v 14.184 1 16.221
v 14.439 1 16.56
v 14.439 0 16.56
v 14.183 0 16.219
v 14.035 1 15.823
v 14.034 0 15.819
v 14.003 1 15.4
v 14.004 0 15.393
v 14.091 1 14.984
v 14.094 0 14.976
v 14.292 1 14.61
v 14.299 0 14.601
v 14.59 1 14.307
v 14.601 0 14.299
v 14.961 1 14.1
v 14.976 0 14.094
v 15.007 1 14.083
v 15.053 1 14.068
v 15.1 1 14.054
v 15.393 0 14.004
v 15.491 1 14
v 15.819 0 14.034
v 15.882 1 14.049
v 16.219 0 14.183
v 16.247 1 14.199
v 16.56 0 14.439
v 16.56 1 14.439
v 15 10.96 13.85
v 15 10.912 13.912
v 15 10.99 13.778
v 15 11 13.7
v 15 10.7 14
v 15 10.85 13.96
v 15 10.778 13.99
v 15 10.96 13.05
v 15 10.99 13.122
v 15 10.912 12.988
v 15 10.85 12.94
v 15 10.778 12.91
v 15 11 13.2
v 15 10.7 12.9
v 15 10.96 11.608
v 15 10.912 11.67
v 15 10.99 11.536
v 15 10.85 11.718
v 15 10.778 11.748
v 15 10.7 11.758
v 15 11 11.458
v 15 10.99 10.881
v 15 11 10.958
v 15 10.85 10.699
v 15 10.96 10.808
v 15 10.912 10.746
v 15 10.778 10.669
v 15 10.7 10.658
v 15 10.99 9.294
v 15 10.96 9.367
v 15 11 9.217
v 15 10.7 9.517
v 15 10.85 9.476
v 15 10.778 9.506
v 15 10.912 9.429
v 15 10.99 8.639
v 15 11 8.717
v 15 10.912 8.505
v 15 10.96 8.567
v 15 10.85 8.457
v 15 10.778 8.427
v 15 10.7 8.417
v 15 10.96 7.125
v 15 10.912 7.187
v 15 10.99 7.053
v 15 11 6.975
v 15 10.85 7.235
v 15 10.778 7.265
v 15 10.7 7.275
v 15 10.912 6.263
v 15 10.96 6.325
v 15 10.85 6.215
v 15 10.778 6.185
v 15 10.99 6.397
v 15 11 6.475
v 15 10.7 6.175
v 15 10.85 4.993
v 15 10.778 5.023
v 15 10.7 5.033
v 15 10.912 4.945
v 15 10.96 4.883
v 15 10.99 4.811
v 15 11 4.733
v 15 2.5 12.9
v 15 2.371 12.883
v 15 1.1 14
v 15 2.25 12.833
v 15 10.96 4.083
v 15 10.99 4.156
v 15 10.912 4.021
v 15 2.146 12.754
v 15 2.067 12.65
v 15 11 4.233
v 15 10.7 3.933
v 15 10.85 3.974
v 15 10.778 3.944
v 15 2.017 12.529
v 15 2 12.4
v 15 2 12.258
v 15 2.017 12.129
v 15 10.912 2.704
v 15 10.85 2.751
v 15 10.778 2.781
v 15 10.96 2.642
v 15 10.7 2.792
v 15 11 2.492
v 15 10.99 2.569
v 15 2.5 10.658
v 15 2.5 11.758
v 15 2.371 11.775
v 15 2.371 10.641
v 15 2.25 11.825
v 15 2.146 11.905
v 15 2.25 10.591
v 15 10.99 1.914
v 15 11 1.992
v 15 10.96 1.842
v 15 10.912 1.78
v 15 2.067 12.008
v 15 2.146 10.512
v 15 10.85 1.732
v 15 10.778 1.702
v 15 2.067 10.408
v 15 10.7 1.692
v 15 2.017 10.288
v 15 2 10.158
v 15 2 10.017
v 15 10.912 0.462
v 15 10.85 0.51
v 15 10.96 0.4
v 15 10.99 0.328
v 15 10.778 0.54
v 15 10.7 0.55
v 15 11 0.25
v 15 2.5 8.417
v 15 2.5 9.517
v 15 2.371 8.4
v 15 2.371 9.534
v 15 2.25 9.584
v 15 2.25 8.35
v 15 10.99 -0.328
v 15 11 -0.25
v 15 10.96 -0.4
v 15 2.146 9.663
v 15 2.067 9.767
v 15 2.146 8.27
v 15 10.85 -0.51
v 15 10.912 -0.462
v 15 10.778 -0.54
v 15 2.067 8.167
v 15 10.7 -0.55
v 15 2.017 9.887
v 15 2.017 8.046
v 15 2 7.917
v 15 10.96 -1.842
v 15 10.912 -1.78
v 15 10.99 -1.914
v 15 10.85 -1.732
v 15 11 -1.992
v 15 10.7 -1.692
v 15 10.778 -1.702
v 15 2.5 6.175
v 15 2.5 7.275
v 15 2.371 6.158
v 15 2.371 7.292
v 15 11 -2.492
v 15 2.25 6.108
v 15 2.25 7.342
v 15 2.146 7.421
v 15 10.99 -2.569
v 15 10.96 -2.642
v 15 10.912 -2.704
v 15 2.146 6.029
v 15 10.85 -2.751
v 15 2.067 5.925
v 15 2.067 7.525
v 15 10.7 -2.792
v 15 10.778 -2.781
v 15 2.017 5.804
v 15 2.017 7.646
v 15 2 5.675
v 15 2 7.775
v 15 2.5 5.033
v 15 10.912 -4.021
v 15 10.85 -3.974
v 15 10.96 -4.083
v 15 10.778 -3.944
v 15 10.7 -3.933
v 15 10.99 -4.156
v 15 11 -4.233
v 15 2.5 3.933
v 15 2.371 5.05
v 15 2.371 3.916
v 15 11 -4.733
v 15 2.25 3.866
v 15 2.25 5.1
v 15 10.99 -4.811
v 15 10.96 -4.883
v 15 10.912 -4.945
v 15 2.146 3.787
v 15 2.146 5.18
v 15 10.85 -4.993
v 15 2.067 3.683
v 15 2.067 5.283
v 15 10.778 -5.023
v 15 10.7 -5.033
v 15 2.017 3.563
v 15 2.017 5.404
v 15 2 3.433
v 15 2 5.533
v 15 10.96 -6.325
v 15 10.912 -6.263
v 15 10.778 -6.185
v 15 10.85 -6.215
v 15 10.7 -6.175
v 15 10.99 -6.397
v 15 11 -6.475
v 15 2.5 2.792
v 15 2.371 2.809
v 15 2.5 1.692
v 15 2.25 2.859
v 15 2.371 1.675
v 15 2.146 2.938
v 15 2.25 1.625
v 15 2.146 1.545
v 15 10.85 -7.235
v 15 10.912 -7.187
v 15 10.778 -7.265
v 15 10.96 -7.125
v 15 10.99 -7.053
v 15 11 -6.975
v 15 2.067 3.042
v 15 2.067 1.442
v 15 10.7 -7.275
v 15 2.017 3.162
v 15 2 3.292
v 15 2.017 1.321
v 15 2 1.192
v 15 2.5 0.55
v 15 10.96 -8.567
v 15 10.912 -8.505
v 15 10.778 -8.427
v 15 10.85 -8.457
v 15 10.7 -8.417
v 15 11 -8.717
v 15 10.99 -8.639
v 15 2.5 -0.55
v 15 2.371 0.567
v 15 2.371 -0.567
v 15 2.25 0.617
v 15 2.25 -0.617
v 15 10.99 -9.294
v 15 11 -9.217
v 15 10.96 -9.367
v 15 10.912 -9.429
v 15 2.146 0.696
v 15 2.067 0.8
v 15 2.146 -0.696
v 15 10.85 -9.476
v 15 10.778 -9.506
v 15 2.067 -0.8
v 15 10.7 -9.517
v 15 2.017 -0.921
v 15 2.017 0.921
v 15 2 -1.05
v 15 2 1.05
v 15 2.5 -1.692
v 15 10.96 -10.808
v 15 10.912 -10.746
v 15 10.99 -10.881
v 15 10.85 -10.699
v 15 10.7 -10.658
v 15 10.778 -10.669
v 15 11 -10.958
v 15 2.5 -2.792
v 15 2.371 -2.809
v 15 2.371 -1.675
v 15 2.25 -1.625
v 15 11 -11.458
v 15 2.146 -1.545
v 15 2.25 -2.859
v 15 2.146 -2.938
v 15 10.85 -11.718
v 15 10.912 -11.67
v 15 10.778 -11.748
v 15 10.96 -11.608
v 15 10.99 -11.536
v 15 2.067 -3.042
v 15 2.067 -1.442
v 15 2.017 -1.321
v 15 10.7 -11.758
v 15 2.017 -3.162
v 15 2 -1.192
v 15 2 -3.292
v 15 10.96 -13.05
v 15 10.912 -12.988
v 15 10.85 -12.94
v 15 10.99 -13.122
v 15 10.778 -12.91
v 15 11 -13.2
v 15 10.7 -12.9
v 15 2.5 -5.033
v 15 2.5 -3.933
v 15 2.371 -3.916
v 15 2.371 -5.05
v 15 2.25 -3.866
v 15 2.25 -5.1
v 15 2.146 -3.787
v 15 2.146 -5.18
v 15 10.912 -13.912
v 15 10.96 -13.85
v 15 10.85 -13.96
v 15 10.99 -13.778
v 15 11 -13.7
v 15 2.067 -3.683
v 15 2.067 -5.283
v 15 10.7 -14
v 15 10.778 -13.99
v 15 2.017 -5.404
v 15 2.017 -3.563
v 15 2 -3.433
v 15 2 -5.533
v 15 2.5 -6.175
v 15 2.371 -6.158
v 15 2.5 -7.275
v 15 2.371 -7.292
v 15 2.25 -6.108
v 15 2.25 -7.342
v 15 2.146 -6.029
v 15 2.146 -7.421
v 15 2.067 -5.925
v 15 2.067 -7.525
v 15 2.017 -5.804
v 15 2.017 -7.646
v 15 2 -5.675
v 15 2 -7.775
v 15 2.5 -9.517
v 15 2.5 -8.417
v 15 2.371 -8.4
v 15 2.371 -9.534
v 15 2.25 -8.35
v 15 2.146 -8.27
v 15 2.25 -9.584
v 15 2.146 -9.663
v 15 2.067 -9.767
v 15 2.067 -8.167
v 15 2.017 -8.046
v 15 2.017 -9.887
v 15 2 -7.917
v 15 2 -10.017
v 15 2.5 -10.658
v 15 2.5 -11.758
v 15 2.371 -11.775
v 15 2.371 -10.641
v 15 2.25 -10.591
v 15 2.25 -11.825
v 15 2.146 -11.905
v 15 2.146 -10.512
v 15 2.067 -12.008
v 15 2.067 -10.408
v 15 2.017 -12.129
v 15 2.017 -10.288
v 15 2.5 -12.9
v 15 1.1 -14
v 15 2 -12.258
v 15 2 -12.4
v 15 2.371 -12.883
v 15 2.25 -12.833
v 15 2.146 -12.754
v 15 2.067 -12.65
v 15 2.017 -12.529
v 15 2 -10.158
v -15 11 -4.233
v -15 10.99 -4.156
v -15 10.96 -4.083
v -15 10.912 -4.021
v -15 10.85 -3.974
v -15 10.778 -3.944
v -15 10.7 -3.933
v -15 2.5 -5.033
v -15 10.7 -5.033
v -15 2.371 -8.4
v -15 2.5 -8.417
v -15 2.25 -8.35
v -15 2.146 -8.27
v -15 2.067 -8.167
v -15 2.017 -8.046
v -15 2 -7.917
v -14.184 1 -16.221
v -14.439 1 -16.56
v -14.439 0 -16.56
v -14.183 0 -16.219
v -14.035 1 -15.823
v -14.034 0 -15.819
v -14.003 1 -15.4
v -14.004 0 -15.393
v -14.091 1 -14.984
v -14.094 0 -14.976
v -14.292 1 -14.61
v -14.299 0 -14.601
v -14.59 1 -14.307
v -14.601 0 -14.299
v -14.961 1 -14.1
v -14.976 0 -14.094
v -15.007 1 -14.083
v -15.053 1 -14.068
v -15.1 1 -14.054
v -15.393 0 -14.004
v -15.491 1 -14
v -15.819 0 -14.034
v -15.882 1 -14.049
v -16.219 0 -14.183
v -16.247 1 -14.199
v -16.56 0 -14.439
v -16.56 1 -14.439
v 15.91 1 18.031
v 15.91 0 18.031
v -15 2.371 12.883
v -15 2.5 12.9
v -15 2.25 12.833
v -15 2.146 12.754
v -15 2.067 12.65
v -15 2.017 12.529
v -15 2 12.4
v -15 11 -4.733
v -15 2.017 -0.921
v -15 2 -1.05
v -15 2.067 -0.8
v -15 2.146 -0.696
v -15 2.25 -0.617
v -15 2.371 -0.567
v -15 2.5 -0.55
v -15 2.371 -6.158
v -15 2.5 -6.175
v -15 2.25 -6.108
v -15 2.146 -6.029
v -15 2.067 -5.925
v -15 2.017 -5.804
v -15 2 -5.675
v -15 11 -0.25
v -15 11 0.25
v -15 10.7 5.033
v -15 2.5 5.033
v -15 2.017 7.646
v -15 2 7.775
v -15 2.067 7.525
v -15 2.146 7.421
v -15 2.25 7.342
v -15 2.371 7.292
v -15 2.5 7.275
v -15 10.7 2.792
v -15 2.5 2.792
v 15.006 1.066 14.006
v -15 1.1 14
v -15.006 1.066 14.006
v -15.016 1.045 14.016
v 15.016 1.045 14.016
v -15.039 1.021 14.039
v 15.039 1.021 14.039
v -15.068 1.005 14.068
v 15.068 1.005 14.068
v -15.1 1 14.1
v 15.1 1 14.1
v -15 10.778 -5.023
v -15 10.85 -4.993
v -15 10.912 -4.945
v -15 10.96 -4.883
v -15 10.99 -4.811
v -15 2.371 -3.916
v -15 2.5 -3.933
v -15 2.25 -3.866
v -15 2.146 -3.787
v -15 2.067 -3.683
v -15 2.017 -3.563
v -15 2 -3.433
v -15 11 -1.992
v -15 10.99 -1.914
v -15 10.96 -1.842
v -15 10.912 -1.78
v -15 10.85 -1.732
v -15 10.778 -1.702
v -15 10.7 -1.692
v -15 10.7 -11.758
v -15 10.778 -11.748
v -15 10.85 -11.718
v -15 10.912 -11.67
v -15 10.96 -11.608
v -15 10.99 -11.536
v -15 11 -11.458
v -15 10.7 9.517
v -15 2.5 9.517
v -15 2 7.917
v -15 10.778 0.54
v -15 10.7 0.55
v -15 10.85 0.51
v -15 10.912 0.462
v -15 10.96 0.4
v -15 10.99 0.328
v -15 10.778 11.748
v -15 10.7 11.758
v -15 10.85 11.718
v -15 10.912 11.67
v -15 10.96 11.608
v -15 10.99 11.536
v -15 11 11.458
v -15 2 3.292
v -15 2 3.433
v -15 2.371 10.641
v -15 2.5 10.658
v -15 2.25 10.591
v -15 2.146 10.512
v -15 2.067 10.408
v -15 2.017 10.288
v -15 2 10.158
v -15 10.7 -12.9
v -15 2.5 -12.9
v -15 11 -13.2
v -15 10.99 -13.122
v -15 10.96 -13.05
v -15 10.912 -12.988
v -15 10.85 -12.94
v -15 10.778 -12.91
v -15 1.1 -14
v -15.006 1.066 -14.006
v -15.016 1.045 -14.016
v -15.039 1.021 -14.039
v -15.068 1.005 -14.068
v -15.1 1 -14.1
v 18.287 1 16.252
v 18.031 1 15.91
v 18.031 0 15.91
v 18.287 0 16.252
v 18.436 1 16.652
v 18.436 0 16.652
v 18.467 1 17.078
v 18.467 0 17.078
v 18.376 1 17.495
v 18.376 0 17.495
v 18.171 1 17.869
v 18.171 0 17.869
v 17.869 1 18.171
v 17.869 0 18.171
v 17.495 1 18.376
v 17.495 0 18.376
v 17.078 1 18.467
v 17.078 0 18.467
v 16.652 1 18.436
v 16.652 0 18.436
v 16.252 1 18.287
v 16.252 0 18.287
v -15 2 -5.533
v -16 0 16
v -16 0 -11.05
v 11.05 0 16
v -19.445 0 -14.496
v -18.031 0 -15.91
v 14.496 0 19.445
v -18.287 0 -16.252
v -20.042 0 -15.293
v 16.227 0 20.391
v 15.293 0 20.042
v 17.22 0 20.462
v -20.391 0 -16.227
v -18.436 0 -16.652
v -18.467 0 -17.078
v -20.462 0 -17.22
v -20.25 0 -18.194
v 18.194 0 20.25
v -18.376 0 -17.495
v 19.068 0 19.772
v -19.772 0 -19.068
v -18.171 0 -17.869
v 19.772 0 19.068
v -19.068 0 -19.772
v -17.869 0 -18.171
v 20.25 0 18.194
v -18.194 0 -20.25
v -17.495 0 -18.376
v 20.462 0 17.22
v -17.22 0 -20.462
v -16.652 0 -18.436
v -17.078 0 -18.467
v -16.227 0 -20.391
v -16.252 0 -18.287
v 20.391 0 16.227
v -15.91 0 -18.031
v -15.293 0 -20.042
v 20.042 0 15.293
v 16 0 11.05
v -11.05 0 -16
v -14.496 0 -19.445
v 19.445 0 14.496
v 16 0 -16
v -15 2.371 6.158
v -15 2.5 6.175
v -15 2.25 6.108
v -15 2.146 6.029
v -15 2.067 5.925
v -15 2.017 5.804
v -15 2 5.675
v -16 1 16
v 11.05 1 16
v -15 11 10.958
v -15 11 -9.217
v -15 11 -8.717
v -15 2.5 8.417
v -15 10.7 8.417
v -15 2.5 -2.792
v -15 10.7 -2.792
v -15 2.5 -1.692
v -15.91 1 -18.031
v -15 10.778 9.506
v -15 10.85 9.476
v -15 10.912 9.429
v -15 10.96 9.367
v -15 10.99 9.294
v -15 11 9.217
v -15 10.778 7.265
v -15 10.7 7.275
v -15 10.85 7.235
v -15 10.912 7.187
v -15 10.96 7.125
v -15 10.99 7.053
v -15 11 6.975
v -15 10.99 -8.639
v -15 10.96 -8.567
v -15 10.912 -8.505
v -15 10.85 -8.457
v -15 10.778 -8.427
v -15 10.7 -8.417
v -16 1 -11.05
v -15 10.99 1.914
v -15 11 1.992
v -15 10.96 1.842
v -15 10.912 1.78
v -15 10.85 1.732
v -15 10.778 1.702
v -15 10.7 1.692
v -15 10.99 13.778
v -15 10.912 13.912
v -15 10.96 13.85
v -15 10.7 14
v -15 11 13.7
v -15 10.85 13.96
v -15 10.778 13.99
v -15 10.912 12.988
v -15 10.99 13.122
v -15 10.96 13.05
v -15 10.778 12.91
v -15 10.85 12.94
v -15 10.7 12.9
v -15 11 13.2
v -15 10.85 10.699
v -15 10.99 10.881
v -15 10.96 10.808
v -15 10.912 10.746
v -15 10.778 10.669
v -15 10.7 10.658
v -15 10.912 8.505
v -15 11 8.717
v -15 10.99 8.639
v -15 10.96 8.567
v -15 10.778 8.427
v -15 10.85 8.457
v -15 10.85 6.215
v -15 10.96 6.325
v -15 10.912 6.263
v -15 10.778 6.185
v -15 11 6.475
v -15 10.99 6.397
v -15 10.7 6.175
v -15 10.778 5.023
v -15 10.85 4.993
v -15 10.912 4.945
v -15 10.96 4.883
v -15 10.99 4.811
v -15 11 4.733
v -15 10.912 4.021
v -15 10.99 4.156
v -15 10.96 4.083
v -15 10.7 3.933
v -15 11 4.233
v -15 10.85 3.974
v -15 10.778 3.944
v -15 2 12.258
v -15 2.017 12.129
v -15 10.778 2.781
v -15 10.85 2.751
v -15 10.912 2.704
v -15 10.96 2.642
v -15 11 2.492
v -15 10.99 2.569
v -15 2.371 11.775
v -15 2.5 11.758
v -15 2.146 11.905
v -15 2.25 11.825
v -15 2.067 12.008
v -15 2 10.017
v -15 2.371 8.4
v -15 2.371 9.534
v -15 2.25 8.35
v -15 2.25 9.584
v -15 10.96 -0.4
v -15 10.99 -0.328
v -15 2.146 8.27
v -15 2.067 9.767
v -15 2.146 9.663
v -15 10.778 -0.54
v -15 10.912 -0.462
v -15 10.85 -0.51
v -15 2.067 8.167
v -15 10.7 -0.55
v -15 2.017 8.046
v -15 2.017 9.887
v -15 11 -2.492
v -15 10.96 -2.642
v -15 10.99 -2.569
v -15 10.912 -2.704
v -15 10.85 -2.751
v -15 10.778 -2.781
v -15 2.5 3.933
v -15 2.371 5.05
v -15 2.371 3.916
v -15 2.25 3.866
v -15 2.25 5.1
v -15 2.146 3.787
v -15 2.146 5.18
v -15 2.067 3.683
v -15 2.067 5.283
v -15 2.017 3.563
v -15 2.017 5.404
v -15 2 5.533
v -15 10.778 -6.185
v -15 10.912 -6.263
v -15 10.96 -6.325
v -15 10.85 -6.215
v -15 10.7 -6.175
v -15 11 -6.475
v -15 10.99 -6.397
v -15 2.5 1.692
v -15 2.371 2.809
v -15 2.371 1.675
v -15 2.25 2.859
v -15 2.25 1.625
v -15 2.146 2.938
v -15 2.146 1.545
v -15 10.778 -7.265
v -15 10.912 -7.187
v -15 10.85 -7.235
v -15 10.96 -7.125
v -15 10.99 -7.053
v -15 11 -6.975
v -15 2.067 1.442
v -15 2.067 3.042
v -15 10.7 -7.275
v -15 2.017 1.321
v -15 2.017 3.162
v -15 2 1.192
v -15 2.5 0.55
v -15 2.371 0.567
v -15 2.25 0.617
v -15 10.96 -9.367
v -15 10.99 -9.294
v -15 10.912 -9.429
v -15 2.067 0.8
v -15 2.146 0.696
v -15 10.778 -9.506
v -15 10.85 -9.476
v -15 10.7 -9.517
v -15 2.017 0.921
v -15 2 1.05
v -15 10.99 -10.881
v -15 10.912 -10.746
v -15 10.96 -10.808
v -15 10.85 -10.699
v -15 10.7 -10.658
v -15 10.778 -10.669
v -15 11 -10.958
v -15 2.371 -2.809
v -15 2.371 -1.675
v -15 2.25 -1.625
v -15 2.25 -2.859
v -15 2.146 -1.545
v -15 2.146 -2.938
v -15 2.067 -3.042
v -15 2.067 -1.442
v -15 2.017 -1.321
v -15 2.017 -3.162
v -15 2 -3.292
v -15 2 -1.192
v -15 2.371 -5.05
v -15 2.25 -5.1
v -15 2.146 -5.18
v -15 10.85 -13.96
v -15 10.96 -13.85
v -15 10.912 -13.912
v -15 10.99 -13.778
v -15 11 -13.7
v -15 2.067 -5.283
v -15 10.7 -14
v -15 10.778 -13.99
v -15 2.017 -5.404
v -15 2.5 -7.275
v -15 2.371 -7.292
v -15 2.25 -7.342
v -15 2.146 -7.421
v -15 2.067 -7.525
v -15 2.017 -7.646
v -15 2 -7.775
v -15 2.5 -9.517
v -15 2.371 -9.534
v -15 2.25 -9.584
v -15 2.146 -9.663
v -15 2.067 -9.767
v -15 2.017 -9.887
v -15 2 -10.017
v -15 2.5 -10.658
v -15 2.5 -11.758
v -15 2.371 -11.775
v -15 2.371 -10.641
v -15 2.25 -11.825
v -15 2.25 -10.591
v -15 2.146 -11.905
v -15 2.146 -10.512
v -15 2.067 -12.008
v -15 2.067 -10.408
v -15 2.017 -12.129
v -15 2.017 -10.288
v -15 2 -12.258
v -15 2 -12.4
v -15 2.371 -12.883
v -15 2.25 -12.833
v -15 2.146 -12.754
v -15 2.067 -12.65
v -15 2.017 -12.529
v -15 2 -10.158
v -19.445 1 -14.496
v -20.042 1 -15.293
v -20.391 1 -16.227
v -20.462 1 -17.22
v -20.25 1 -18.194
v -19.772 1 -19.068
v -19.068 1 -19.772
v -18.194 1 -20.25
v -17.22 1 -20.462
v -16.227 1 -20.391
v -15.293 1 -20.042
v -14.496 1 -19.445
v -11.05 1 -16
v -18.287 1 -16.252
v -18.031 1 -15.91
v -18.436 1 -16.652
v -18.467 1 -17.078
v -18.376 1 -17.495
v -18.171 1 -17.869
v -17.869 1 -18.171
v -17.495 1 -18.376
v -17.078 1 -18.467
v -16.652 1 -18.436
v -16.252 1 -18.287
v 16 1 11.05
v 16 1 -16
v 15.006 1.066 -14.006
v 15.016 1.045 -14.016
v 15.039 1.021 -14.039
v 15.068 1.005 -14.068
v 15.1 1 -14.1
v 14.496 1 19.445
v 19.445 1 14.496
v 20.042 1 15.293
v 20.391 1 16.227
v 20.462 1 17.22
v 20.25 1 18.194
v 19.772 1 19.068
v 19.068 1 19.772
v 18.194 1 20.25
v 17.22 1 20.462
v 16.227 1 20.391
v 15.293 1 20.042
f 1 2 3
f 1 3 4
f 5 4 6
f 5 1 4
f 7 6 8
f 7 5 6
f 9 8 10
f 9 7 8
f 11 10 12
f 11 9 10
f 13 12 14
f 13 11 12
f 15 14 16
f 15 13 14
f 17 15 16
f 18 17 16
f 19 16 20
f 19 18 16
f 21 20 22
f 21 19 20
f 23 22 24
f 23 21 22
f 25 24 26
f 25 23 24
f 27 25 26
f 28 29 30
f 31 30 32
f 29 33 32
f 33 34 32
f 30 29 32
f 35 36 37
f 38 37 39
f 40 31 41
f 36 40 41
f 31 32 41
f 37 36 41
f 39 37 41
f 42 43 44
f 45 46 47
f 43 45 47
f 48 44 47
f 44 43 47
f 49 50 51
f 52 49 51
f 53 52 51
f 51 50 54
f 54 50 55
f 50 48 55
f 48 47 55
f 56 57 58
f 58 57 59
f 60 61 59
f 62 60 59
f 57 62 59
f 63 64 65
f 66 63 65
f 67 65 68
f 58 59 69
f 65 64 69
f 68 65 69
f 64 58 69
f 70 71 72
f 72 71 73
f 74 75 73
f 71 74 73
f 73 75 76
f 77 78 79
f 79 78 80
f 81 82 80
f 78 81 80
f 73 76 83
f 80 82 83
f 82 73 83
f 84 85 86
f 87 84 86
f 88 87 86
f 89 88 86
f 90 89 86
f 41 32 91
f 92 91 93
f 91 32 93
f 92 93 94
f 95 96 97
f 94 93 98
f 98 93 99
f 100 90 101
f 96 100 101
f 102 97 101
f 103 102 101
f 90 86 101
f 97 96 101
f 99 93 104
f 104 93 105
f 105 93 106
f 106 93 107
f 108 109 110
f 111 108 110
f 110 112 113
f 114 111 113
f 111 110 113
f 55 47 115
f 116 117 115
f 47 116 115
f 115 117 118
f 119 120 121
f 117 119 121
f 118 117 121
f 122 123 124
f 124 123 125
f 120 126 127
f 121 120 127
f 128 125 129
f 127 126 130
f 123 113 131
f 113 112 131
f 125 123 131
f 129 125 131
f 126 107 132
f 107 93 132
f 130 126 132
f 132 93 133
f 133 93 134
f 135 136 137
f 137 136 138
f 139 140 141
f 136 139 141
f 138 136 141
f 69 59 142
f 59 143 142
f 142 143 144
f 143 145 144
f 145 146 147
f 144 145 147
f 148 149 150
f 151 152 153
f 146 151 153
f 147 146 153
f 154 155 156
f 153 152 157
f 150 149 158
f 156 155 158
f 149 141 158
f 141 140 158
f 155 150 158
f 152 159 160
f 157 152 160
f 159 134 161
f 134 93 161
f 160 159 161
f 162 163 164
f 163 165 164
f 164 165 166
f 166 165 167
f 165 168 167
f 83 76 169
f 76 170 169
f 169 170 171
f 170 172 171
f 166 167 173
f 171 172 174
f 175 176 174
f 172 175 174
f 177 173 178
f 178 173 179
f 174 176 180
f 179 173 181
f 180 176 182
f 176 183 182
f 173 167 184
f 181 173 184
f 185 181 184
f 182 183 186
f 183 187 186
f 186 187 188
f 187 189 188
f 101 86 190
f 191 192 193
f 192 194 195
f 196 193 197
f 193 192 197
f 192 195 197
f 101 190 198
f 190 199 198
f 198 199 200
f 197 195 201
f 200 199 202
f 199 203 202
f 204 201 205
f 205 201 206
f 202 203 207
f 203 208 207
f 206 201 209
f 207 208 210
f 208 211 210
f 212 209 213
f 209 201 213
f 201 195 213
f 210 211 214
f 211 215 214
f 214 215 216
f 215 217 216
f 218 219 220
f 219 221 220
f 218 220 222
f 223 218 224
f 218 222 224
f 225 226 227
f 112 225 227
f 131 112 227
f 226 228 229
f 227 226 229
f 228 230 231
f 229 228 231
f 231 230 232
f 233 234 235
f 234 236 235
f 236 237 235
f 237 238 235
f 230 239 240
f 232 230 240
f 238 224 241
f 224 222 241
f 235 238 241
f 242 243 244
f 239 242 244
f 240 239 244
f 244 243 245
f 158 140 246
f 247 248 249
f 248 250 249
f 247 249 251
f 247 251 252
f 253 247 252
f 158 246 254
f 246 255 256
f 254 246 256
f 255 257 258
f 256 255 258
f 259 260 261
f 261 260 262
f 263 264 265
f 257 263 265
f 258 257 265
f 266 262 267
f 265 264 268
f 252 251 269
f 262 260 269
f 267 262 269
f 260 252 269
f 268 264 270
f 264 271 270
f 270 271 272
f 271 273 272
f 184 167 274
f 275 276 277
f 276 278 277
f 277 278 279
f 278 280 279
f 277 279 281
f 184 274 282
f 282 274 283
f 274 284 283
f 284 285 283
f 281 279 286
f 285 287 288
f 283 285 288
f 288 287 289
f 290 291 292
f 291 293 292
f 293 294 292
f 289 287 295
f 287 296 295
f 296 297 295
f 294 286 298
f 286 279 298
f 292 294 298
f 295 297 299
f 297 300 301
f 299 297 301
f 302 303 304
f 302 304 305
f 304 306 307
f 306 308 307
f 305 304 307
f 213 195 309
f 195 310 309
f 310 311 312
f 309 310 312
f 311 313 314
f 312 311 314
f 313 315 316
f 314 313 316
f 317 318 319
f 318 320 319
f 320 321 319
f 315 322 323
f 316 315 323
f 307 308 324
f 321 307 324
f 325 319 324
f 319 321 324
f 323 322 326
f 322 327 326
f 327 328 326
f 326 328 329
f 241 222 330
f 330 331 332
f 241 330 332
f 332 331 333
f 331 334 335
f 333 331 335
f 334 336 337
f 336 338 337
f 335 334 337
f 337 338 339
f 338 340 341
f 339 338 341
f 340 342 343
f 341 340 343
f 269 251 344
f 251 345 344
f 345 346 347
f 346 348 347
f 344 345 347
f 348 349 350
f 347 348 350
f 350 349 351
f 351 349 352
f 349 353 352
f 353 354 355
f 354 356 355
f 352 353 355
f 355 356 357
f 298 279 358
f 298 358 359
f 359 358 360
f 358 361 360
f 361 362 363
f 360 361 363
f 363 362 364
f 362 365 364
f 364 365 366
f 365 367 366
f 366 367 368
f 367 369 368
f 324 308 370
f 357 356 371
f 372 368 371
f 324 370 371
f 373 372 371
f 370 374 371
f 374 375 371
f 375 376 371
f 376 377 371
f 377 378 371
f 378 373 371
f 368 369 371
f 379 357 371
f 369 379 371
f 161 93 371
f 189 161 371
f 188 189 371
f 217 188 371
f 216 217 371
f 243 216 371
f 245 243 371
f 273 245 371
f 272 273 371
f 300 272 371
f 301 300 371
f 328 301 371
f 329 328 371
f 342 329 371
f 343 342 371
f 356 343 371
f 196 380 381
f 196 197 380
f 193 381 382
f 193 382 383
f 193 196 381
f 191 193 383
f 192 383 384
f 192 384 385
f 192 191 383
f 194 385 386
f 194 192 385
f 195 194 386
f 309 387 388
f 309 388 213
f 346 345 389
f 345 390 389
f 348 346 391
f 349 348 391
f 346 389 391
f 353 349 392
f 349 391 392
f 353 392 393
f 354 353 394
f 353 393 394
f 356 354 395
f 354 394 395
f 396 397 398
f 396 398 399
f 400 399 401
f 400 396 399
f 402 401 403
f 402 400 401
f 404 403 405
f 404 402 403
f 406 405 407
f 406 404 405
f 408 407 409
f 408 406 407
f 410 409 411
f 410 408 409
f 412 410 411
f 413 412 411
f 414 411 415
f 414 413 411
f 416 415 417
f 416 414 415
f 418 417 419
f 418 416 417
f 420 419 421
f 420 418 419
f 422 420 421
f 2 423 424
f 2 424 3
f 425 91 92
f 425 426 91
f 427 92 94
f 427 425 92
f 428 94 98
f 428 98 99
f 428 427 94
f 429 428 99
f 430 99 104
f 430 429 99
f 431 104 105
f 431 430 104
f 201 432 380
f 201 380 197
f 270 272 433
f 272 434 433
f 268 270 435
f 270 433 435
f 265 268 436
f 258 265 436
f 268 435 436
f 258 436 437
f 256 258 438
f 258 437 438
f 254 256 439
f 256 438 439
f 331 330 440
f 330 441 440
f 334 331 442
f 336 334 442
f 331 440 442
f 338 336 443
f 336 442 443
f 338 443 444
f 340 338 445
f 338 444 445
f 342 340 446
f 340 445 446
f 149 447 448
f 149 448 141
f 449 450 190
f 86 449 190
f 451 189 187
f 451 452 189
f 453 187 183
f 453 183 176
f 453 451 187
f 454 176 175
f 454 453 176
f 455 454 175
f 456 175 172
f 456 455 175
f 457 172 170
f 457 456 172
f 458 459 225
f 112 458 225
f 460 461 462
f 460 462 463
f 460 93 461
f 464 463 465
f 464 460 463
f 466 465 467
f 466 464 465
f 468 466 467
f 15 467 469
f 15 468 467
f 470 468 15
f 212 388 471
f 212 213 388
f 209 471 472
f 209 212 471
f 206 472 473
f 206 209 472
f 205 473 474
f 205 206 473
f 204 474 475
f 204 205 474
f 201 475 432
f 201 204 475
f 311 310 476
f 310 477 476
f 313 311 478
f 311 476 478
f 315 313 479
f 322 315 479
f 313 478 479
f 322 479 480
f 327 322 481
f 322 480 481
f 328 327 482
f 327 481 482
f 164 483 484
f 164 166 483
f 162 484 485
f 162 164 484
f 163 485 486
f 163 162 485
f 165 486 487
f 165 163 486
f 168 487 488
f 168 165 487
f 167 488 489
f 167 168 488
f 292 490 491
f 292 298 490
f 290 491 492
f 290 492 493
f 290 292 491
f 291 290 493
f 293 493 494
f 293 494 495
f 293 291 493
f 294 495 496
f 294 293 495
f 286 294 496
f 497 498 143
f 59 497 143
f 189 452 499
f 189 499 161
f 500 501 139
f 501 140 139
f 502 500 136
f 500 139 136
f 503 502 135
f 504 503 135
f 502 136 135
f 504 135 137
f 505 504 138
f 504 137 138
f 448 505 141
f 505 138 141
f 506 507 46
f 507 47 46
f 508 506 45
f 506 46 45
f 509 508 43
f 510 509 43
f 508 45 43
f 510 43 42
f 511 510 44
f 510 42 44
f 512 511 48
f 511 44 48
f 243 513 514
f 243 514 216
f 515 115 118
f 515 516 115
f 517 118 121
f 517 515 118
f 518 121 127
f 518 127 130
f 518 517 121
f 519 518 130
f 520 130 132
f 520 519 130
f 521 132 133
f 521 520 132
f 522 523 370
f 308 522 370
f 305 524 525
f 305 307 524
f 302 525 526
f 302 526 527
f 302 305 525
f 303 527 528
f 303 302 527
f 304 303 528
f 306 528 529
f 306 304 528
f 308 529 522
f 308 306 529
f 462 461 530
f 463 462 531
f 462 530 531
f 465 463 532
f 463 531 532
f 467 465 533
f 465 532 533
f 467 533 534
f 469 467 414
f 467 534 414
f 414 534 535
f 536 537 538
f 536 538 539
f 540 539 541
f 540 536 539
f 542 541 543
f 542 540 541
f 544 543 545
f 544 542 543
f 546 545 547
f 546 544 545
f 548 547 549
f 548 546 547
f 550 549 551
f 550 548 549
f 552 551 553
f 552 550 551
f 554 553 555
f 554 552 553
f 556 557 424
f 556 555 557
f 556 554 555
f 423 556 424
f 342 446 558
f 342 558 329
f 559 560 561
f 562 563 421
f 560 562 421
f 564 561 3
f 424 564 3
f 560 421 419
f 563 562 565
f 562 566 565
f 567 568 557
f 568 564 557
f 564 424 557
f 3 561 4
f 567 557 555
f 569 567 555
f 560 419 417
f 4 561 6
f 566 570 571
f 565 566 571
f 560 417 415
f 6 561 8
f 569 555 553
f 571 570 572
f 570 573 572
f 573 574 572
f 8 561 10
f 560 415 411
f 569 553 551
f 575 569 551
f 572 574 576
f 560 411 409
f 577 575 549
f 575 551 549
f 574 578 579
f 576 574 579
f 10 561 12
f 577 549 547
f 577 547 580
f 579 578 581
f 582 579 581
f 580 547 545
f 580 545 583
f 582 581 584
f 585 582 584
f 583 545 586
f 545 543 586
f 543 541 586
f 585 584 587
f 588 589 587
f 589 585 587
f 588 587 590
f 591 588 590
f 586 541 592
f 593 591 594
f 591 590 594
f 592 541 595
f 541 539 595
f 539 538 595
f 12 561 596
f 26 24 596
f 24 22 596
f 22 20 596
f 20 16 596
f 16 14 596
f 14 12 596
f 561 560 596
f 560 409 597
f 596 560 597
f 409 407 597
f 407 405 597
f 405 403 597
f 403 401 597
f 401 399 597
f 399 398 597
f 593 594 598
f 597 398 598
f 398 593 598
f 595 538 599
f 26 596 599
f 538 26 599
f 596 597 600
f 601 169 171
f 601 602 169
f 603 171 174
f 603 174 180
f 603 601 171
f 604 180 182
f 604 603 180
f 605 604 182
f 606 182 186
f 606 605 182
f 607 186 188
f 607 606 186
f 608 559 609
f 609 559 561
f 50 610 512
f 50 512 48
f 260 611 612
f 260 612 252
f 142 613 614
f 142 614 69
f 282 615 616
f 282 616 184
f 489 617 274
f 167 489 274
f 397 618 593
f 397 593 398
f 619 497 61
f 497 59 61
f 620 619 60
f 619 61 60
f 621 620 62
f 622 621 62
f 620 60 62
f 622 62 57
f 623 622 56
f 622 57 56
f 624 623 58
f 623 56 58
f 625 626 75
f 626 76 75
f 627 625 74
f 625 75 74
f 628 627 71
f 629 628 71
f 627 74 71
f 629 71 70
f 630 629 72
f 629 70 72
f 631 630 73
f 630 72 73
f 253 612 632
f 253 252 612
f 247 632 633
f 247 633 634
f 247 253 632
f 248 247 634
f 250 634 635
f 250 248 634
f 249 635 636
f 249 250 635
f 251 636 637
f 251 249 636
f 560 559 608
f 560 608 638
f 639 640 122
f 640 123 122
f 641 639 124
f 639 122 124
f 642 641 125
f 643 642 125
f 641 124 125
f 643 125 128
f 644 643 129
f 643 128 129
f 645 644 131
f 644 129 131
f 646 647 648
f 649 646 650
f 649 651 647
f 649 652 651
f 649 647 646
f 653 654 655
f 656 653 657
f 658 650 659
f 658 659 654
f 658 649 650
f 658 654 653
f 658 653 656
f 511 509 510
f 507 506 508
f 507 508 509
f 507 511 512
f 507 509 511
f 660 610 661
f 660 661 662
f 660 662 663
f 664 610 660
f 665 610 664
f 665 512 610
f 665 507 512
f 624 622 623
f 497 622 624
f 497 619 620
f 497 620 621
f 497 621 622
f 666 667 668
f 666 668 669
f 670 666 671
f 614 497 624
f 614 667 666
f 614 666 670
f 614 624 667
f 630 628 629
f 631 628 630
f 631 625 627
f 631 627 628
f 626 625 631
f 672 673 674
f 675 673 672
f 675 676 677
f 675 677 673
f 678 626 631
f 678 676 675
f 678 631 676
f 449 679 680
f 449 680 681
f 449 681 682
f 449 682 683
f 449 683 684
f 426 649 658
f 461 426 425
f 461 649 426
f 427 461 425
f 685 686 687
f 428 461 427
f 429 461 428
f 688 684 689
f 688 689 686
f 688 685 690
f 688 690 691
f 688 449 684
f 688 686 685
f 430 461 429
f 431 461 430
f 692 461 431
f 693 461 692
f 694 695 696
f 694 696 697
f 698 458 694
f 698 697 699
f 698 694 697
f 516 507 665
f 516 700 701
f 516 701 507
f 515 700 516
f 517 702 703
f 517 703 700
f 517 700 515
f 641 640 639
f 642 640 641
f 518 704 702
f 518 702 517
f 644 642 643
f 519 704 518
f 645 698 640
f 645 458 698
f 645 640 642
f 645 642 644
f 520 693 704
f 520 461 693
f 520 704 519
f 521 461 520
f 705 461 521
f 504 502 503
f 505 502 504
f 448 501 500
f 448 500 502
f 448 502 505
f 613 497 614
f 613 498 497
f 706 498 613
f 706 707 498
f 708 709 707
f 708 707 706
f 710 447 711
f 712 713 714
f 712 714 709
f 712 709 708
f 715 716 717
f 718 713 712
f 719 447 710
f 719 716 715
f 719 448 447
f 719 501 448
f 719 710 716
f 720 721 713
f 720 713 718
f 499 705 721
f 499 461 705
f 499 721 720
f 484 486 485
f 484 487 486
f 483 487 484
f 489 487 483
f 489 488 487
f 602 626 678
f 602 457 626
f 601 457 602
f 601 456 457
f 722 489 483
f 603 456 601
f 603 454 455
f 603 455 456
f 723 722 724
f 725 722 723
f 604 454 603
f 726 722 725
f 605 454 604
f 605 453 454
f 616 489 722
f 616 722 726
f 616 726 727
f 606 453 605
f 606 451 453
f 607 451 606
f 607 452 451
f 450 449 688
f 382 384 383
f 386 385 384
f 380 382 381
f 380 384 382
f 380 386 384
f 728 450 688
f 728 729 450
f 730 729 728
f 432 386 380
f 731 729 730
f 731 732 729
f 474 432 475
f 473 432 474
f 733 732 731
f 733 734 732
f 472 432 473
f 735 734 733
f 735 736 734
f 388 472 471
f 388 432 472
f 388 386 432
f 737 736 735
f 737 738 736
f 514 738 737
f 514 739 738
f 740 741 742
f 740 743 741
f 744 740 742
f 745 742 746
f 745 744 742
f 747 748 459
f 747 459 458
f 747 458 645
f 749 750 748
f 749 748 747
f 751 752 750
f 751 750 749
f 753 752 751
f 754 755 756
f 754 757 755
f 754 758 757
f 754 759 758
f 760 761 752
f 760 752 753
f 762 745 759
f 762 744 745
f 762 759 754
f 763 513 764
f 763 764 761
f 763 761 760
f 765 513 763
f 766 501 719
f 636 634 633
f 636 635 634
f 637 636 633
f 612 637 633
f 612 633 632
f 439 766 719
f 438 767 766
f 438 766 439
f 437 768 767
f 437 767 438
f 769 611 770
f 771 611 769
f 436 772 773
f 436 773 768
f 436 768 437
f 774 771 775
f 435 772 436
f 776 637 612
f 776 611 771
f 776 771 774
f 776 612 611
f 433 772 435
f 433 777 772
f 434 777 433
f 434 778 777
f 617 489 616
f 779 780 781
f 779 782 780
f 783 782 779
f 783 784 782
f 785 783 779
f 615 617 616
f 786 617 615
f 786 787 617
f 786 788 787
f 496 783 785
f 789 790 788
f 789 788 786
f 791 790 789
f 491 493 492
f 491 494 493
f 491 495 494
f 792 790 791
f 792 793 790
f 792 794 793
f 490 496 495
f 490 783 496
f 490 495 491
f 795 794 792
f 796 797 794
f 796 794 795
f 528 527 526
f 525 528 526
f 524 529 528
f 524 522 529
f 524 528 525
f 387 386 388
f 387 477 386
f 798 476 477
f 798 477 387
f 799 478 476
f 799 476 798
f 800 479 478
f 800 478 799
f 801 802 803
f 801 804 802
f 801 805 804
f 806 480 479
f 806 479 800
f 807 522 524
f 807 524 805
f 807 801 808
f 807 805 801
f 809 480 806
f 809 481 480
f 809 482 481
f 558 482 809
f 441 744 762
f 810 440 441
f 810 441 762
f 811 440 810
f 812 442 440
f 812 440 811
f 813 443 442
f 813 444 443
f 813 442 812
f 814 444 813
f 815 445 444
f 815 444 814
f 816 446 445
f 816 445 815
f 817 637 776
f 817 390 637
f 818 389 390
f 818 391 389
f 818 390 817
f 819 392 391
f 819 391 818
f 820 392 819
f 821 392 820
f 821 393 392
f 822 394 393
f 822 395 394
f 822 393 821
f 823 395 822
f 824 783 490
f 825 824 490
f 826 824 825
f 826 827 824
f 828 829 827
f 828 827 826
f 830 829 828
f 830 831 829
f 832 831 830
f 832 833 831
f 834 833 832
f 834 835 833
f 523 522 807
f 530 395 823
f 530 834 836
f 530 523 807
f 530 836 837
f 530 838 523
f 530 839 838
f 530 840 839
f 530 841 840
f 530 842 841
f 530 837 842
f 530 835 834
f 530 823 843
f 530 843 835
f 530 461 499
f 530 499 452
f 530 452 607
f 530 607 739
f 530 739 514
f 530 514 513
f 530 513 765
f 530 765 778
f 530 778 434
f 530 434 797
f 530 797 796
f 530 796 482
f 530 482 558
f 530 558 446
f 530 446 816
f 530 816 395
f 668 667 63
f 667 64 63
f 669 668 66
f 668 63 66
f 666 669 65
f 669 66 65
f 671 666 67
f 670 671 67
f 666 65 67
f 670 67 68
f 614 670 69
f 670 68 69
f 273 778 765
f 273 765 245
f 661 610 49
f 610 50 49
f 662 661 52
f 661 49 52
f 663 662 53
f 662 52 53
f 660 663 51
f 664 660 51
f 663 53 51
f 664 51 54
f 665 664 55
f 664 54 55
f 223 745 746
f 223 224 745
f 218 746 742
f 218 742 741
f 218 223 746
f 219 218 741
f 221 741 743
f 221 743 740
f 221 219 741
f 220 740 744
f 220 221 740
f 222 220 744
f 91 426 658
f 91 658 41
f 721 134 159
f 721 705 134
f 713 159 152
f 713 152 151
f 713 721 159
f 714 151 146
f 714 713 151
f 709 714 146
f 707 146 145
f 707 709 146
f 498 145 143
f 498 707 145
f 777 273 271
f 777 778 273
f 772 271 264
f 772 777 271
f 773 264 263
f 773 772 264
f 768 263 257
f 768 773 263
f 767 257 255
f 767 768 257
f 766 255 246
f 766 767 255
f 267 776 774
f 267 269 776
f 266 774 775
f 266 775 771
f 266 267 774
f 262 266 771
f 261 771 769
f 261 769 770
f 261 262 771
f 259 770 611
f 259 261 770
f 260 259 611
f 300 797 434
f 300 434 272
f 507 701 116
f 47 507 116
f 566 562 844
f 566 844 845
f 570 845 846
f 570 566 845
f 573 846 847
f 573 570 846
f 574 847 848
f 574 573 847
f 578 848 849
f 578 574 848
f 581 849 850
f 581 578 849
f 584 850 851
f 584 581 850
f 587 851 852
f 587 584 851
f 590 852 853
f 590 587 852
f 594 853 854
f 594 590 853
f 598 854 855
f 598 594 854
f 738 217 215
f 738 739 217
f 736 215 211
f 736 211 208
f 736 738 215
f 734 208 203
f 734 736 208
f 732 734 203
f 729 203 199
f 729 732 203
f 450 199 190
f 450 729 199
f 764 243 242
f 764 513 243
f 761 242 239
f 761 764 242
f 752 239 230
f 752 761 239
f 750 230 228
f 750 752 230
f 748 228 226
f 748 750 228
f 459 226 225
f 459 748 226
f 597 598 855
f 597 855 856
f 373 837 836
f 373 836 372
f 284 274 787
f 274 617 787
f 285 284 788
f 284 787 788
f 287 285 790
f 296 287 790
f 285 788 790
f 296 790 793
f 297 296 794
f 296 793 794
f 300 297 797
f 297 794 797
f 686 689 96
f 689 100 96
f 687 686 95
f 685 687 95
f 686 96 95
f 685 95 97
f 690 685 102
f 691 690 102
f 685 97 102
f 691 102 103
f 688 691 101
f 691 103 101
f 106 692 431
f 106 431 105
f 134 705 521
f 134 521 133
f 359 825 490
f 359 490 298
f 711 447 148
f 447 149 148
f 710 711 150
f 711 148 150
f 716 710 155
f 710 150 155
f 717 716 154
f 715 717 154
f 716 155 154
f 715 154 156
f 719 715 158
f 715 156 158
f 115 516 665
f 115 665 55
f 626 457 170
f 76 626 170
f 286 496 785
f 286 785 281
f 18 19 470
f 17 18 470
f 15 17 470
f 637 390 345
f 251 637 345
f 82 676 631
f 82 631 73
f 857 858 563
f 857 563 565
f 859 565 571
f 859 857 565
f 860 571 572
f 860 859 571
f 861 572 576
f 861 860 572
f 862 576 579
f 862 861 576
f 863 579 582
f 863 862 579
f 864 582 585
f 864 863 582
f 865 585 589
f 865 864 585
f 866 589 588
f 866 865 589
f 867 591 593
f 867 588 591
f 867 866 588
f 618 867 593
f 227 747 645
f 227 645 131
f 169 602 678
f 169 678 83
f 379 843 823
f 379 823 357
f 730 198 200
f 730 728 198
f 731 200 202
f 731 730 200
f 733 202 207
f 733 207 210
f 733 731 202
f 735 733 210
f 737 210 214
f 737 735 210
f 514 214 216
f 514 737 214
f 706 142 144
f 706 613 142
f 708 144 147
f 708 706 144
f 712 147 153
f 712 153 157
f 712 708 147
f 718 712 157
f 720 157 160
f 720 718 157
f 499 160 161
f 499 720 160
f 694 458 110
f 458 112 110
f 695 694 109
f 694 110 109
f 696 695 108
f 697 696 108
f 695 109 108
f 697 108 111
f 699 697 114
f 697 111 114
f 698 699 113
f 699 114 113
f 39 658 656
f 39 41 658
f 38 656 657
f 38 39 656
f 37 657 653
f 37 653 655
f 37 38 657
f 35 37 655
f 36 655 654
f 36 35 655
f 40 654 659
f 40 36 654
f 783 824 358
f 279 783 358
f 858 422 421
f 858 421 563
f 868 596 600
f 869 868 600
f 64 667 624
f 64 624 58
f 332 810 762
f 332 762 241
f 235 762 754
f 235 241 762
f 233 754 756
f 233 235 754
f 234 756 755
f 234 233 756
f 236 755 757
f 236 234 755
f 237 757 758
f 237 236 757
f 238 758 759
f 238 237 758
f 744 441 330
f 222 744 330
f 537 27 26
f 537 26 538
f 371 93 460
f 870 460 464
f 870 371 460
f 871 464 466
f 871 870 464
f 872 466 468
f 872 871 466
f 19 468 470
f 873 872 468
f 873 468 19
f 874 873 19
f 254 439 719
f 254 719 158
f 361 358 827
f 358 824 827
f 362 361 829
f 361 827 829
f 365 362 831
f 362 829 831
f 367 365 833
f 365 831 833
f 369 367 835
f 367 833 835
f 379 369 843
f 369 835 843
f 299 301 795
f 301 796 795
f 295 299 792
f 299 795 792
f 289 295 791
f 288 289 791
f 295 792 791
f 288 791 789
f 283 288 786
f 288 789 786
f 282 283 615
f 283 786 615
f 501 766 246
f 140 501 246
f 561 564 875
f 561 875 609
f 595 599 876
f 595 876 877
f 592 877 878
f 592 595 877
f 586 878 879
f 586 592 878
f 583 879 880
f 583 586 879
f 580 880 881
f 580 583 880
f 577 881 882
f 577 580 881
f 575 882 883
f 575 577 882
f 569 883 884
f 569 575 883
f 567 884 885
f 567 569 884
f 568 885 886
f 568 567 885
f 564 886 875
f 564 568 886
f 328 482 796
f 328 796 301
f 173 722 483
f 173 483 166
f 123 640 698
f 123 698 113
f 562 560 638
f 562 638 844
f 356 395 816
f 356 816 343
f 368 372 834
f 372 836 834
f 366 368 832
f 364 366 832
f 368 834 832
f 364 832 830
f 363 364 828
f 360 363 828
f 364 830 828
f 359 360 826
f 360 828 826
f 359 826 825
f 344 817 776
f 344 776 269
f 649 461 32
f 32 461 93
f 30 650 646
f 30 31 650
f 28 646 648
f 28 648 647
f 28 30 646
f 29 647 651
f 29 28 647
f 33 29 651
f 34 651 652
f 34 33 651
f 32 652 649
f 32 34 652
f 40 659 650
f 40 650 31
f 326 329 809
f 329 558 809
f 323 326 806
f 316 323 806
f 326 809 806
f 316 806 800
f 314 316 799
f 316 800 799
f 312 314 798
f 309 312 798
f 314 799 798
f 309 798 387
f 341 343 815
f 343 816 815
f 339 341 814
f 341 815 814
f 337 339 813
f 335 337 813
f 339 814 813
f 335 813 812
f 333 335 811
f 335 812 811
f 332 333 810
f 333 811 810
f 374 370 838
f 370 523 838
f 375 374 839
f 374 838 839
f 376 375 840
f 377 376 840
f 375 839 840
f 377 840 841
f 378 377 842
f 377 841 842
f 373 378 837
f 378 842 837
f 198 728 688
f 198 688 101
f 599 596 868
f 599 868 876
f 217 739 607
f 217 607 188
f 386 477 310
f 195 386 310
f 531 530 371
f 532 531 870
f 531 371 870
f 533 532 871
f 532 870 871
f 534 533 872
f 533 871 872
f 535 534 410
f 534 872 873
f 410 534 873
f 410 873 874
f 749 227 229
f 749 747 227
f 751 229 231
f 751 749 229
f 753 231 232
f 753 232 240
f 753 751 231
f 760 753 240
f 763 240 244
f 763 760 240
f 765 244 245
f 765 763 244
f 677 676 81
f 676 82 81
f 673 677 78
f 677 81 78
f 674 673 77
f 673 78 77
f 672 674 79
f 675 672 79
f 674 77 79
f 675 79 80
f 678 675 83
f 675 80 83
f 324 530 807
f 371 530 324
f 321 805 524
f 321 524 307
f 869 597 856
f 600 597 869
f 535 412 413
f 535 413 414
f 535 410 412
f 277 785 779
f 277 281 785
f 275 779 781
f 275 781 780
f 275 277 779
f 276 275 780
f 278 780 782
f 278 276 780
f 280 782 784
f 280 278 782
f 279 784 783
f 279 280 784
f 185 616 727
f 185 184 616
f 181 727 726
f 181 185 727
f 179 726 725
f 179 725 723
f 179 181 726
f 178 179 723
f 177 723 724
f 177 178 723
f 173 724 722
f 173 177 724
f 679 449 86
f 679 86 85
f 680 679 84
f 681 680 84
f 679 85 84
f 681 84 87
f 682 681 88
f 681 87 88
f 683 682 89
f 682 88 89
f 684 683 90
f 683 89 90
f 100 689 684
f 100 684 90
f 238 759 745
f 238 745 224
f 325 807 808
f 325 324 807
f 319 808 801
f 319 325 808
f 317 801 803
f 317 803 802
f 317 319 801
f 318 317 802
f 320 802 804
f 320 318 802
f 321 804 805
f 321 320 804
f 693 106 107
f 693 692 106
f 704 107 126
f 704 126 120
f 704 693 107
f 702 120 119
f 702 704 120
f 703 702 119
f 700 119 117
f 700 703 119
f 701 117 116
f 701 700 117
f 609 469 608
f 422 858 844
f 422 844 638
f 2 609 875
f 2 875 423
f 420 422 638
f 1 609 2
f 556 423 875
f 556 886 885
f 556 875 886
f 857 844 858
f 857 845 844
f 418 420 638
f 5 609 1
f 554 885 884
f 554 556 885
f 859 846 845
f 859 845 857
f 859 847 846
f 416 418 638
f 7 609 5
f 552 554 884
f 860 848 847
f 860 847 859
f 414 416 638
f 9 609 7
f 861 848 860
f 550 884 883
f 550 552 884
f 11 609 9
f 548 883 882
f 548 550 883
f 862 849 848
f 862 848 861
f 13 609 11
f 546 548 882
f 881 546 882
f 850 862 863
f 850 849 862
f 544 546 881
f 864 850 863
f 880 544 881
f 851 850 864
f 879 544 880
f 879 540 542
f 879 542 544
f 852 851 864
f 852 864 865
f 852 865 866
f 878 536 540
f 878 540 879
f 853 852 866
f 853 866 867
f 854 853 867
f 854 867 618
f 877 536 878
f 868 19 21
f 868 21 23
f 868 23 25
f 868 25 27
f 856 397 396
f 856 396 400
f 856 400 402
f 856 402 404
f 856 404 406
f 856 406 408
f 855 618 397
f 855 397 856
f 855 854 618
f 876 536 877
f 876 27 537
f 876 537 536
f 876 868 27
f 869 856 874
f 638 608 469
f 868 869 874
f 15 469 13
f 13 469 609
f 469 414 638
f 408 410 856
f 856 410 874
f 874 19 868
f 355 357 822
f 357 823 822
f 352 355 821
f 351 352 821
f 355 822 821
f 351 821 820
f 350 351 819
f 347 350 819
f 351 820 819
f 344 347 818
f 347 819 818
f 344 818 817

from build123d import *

# Parameters (mm, degrees)
SZKIC1_W                    = 32
SZKIC1_H                    = 32
DODANIE_WYCI_GNI_CIE2_DEPTH = 1
SZKIC3_W                    = 30
SZKIC3_H                    = 28
DODANIE_WYCI_GNI_CIE3_DEPTH = 1
SZKIC2_W                    = 30
SZKIC2_H                    = 1.1
DODANIE_WYCI_GNI_CIE4_DEPTH = 10
ZAOKR_GLENIE1_R             = 0.1
ZAOKR_GLENIE3_R             = 0.5
ZAOKR_GLENIE4_R             = 0.3
WYTNIJ_WYCI_GNI_CIE1_DEPTH  = 2


with BuildPart() as part:
    # Szkic1 → Dodanie-wyciągnięcie2 (new body)
    with BuildSketch(Plane(origin=(0, 0, 0), x_dir=(1, 0, 0), z_dir=(0, 1, 0))):
        Rectangle(SZKIC1_W, SZKIC1_H)
        with BuildLine():
            Line((-14.495689014, 19.445436483), (19.445436483, -14.495689014))
            ThreePointArc((19.445436483, -14.495689014), (19.445436483, -19.445436483), (14.495689014, -19.445436483))
            Line((14.495689014, -19.445436483), (-19.445436483, 14.495689014))
            ThreePointArc((-19.445436483, 14.495689014), (-19.445436483, 19.445436483), (-14.495689014, 19.445436483))
        make_face()
    extrude(amount=DODANIE_WYCI_GNI_CIE2_DEPTH)

    # Szkic3 → Dodanie-wyciągnięcie3 (add)
    with BuildSketch(Plane(origin=(0, 1, 0), x_dir=(1, 0, 0), z_dir=(0, 1, 0))):
        Rectangle(SZKIC3_W, SZKIC3_H)
    extrude(amount=DODANIE_WYCI_GNI_CIE3_DEPTH)

    # Szkic2 → Dodanie-wyciągnięcie4 (add)
    with BuildSketch(Plane(origin=(0, 1, 0), x_dir=(1, 0, 0), z_dir=(0, 1, 0))):
        with Locations((0, 13.45)):
            Rectangle(SZKIC2_W, SZKIC2_H)
        with Locations((0, 11.208333333)):
            Rectangle(SZKIC2_W, SZKIC2_H)
        with Locations((0, 8.966666667)):
            Rectangle(SZKIC2_W, SZKIC2_H)
        with Locations((0, 6.725)):
            Rectangle(SZKIC2_W, SZKIC2_H)
        with Locations((0, 4.483333333)):
            Rectangle(SZKIC2_W, SZKIC2_H)
        with Locations((0, 2.241666667)):
            Rectangle(SZKIC2_W, SZKIC2_H)
        Rectangle(SZKIC2_W, SZKIC2_H)
        with Locations((0, -2.241666667)):
            Rectangle(SZKIC2_W, SZKIC2_H)
        with Locations((0, -4.483333333)):
            Rectangle(SZKIC2_W, SZKIC2_H)
        with Locations((0, -6.725)):
            Rectangle(SZKIC2_W, SZKIC2_H)
        with Locations((0, -8.966666667)):
            Rectangle(SZKIC2_W, SZKIC2_H)
        with Locations((0, -11.208333333)):
            Rectangle(SZKIC2_W, SZKIC2_H)
        with Locations((0, -13.45)):
            Rectangle(SZKIC2_W, SZKIC2_H)
    extrude(amount=DODANIE_WYCI_GNI_CIE4_DEPTH)

    # Zaokrąglenie1
    zaokr_glenie1_edges = [part.edges().sort_by_distance(p)[0] for p in [
        (-15, 1, 0),
        (0, 1, 14),
        (15, 1, 0),
        (0, 1, -14),
    ]]
    fillet(zaokr_glenie1_edges, radius=ZAOKR_GLENIE1_R)

    # Zaokrąglenie3
    zaokr_glenie3_edges = [part.edges().sort_by_distance(p)[0] for p in [
        (0, 2, -6.175),
        (0, 2, -7.275),
        (0, 2, -3.933333333),
        (0, 2, -5.033333333),
        (0, 2, -1.691666667),
        (0, 2, -2.791666667),
        (0, 2, 0.55),
        (0, 2, -0.55),
        (0, 2, 2.791666667),
        (0, 2, 1.691666667),
        (0, 2, 5.033333333),
        (0, 2, 3.933333333),
        (0, 2, 7.275),
        (0, 2, 6.175),
        (0, 2, 9.516666667),
        (0, 2, 8.416666667),
        (0, 2, 11.758333333),
        (0, 2, 10.658333333),
        (0, 2, 12.9),
        (0, 2, -12.9),
        (0, 2, -10.658333333),
        (0, 2, -11.758333333),
        (0, 2, -8.416666667),
        (0, 2, -9.516666667),
    ]]
    fillet(zaokr_glenie3_edges, radius=ZAOKR_GLENIE3_R)

    # Zaokrąglenie4
    zaokr_glenie4_edges = [part.edges().sort_by_distance(p)[0] for p in [
        (0, 11, -6.175),
        (0, 11, -7.275),
        (0, 11, -3.933333333),
        (0, 11, -5.033333333),
        (0, 11, -1.691666667),
        (0, 11, -2.791666667),
        (0, 11, 0.55),
        (0, 11, -0.55),
        (0, 11, 2.791666667),
        (0, 11, 1.691666667),
        (0, 11, 5.033333333),
        (0, 11, 3.933333333),
        (0, 11, 7.275),
        (0, 11, 6.175),
        (0, 11, 9.516666667),
        (0, 11, 8.416666667),
        (0, 11, 11.758333333),
        (0, 11, 10.658333333),
        (0, 11, 14),
        (0, 11, 12.9),
        (0, 11, -12.9),
        (0, 11, -14),
        (0, 11, -10.658333333),
        (0, 11, -11.758333333),
        (0, 11, -8.416666667),
        (0, 11, -9.516666667),
    ]]
    fillet(zaokr_glenie4_edges, radius=ZAOKR_GLENIE4_R)

    # Szkic4 → Wytnij-wyciągnięcie1 (cut, through all)
    with BuildSketch(Plane(origin=(0, 1, 0), x_dir=(1, 0, 0), z_dir=(0, 1, 0))):
        with BuildLine():
            Line((-15.909902577, 18.03122292), (-14.439120472, 16.560440815))
            ThreePointArc((-14.439120472, 16.560440815), (-14.439120472, 14.439120472), (-16.560440815, 14.439120472))
            Line((-16.560440815, 14.439120472), (-18.03122292, 15.909902577))
            ThreePointArc((-18.03122292, 15.909902577), (-18.03122292, 18.03122292), (-15.909902577, 18.03122292))
        make_face()
        with BuildLine():
            Line((15.909902577, -18.03122292), (14.439120472, -16.560440815))
            ThreePointArc((14.439120472, -16.560440815), (14.439120472, -14.439120472), (16.560440815, -14.439120472))
            Line((16.560440815, -14.439120472), (18.03122292, -15.909902577))
            ThreePointArc((18.03122292, -15.909902577), (18.03122292, -18.03122292), (15.909902577, -18.03122292))
        make_face()
    extrude(amount=-WYTNIJ_WYCI_GNI_CIE1_DEPTH, mode=Mode.SUBTRACT)


solid = part.part
